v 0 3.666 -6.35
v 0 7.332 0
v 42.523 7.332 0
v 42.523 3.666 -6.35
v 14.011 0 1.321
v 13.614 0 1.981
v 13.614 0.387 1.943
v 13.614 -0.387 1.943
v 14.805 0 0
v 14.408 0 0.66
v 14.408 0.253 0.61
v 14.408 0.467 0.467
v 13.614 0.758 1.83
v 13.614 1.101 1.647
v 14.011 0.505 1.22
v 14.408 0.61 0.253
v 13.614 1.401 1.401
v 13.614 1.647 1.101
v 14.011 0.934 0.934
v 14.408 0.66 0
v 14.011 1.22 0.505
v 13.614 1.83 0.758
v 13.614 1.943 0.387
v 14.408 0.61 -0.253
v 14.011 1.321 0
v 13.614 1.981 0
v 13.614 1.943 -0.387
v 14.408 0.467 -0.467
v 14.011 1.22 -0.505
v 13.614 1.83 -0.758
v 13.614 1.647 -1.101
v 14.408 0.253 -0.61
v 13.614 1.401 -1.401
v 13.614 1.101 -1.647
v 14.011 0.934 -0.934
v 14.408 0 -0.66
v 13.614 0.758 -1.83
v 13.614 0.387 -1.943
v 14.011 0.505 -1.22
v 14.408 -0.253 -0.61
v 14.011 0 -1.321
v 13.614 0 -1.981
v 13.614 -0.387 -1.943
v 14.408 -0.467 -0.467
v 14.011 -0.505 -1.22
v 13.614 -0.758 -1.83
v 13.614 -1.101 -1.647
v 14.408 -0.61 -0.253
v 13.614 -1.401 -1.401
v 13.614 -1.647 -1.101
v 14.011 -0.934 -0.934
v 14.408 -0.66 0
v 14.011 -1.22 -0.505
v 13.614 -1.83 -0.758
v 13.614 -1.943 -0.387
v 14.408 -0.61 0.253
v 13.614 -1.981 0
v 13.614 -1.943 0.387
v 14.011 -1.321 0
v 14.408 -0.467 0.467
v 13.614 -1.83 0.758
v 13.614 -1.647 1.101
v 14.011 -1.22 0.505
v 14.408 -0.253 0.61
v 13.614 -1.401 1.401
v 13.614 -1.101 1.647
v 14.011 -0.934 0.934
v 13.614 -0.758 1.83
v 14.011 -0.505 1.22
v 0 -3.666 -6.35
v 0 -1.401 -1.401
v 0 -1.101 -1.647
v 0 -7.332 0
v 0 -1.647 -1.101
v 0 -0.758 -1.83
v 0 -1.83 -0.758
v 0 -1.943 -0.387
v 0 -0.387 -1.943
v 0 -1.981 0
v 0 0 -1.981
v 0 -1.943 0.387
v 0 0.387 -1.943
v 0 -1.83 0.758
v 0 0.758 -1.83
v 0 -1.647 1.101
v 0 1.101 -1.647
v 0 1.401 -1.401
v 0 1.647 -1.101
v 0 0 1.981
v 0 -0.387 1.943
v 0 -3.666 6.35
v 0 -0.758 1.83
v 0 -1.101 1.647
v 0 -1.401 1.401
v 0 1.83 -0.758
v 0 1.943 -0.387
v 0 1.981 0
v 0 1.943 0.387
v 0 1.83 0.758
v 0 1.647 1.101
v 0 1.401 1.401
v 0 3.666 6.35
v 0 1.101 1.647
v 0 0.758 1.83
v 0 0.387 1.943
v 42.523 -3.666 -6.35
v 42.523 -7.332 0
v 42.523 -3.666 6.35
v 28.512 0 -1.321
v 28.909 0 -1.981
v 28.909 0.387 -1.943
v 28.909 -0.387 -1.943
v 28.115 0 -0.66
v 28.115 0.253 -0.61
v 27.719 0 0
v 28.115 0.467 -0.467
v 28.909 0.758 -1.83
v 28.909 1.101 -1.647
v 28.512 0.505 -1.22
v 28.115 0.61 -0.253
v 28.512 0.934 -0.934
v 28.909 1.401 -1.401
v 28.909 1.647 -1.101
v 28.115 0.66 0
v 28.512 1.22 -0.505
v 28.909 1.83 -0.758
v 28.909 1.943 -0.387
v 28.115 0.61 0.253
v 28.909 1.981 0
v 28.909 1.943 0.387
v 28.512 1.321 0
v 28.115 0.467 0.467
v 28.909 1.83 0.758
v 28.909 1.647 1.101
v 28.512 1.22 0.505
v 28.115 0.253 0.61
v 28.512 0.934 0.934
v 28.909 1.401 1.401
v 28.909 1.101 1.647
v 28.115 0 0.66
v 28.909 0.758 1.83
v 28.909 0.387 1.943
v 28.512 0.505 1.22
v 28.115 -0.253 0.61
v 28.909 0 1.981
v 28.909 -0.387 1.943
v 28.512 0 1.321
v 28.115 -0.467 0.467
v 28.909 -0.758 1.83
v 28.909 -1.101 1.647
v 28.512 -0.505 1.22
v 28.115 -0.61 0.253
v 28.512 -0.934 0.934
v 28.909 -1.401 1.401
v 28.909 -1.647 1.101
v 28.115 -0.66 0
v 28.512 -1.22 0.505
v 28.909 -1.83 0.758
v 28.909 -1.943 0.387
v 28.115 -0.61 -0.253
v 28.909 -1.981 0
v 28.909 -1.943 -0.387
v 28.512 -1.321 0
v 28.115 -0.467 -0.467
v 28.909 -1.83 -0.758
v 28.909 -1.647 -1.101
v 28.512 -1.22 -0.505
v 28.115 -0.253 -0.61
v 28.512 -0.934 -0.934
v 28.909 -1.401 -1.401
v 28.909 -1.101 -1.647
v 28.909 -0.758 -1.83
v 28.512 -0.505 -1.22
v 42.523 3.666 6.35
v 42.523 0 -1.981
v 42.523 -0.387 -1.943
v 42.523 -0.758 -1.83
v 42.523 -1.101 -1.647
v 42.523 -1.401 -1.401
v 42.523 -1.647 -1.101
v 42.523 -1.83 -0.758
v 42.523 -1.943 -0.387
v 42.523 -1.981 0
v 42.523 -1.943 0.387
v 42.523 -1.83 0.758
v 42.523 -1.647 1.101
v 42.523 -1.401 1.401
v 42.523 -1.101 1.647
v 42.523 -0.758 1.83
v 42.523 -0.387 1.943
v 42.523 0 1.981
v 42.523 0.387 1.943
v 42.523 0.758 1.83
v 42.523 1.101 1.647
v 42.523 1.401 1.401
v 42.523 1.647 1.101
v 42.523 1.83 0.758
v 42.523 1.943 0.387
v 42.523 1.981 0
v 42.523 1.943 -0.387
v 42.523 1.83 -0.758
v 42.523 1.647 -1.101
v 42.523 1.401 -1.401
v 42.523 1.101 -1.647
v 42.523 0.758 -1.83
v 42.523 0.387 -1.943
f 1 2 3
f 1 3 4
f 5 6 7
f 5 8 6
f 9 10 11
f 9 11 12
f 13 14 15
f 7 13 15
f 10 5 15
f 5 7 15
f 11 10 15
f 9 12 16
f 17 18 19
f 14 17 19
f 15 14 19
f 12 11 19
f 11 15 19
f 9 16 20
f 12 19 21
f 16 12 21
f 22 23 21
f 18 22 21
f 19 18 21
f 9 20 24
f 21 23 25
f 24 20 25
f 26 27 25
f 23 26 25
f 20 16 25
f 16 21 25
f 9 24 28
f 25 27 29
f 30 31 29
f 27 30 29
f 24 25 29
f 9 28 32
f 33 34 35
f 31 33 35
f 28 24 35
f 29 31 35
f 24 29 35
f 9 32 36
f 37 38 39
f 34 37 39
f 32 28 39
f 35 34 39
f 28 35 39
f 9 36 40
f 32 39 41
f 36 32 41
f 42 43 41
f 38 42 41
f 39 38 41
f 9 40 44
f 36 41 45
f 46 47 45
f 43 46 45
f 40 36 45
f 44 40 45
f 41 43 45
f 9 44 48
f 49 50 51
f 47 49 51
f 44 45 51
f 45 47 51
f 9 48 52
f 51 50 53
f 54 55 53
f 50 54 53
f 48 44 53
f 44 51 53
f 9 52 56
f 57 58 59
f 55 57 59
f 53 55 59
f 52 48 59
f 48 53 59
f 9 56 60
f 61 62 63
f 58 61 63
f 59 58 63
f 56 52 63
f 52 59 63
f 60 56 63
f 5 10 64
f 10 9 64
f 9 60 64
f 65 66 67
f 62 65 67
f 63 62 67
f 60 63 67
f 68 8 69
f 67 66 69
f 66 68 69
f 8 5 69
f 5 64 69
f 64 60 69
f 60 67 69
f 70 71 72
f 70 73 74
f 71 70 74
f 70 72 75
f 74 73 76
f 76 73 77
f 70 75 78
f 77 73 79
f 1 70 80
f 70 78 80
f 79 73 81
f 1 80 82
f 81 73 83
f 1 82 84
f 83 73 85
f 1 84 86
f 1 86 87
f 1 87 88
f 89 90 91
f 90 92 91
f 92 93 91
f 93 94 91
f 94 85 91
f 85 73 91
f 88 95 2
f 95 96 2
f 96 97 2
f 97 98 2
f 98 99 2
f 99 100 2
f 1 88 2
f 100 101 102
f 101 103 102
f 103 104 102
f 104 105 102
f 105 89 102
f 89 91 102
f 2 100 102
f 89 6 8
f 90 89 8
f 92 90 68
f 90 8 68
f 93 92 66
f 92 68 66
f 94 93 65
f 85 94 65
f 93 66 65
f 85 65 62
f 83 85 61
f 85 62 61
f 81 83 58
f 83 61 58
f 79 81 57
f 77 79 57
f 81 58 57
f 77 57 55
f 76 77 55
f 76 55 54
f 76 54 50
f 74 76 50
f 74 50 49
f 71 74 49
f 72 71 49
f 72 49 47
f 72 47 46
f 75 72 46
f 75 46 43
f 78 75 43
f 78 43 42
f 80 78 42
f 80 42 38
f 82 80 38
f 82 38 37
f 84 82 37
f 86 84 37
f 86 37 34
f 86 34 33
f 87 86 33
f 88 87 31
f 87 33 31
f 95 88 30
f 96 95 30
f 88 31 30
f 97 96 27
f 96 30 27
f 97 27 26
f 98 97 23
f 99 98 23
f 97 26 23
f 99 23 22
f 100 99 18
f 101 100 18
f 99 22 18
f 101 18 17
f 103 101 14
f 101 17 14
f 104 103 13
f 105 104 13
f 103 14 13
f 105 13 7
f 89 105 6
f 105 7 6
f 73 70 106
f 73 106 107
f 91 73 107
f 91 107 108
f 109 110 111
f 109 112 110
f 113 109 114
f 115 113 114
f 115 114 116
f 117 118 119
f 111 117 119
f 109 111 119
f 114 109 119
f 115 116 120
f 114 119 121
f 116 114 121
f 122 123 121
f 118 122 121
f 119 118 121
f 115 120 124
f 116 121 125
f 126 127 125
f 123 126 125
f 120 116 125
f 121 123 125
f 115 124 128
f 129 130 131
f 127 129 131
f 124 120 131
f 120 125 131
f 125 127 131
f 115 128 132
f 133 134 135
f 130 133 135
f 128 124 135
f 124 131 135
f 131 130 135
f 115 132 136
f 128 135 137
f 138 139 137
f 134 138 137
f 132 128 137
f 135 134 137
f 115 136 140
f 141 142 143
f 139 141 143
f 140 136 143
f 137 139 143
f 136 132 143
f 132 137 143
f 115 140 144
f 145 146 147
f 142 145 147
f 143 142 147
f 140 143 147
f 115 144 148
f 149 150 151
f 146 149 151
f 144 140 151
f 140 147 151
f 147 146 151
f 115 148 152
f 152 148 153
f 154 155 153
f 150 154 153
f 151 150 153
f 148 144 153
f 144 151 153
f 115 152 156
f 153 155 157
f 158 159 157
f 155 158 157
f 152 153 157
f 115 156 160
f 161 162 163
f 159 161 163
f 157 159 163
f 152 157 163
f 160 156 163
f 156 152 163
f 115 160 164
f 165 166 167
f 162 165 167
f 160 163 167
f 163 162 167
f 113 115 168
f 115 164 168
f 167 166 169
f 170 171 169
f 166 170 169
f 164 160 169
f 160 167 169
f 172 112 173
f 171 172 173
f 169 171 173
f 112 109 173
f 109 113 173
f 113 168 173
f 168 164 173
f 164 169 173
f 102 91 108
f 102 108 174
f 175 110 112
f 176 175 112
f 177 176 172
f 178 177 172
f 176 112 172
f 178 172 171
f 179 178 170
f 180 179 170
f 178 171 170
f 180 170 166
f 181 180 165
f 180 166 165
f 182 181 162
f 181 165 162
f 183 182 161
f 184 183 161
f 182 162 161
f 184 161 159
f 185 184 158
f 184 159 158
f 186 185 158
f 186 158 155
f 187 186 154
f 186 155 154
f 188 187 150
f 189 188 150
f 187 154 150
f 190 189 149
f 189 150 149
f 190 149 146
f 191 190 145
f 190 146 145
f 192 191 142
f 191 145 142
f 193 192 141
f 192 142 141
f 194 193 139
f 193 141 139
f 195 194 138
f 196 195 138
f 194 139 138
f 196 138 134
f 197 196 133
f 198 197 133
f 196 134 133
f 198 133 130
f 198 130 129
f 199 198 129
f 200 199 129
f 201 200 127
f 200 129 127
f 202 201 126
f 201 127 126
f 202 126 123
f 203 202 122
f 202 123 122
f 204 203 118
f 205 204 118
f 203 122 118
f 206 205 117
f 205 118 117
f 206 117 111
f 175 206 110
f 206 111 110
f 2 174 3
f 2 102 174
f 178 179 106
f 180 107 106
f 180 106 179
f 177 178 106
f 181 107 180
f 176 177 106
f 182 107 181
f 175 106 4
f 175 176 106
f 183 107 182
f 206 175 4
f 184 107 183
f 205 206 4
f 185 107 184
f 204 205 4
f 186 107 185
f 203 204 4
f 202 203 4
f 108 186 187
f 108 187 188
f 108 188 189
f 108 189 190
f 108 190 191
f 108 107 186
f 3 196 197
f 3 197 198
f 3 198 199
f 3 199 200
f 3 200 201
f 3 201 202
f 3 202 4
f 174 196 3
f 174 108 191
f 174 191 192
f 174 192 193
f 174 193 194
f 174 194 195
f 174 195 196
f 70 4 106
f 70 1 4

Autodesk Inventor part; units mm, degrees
ref_plane "YZ Plane" through (0, 0, 0) normal (1, 0, 0) x (0, 1, 0)
ref_plane "XZ Plane" through (0, 0, 0) normal (0, 1, 0) x (-1, 0, 0)
ref_plane "XY Plane" through (0, 0, 0) normal (0, 0, 1) x (1, 0, 0)
sketch "Sketch1" plane through (0, 0, 0) normal (1, 0, 0) x (0, 1, 0)
  line L0 (3.6662, -6.35) -> (-3.6662, -6.35)
  line L1 (-3.6662, -6.35) -> (-7.3323, 0)
  line L2 (-7.3323, 0) -> (-3.6662, 6.35)
  line L3 (-3.6662, 6.35) -> (3.6662, 6.35)
  line L4 (3.6662, 6.35) -> (7.3323, 0)
  line L5 (7.3323, 0) -> (3.6662, -6.35)
  point P0 (0, 0)
  point P1 (0, 0)
  dimension "d0" = 12.7
extrude "Extrusion1" add sketch "Sketch1" along normal blind 42.5234
sketch "Sketch2" plane through (42.5234, 0, 0) normal (1, 0, 0) x (0, 0, -1)
  point P0 (0, 0)
  point P1 (0, 0)
hole "Hole1" at (42.5234, 0, 0) direction (-1, 0, 0) diameter 3.9624 depth 13.6144 tip angle 118 thread size "10-32 UNF" class "2B" standard "ANSI Unified Screw Threads"
sketch "Sketch3" plane through (0, 0, 0) normal (-1, 0, 0) x (0, 0, 1)
  point P0 (0, 0)
  point P1 (0, 0)
hole "Hole2" at (0, 0, 0) direction (1, 0, 0) diameter 3.9624 depth 13.6144 tip angle 118 thread size "10-32 UNF" class "2B" standard "ANSI Unified Screw Threads"
properties part number "STOCK,HEX,SHAFT,KICKER,REVERSER"
